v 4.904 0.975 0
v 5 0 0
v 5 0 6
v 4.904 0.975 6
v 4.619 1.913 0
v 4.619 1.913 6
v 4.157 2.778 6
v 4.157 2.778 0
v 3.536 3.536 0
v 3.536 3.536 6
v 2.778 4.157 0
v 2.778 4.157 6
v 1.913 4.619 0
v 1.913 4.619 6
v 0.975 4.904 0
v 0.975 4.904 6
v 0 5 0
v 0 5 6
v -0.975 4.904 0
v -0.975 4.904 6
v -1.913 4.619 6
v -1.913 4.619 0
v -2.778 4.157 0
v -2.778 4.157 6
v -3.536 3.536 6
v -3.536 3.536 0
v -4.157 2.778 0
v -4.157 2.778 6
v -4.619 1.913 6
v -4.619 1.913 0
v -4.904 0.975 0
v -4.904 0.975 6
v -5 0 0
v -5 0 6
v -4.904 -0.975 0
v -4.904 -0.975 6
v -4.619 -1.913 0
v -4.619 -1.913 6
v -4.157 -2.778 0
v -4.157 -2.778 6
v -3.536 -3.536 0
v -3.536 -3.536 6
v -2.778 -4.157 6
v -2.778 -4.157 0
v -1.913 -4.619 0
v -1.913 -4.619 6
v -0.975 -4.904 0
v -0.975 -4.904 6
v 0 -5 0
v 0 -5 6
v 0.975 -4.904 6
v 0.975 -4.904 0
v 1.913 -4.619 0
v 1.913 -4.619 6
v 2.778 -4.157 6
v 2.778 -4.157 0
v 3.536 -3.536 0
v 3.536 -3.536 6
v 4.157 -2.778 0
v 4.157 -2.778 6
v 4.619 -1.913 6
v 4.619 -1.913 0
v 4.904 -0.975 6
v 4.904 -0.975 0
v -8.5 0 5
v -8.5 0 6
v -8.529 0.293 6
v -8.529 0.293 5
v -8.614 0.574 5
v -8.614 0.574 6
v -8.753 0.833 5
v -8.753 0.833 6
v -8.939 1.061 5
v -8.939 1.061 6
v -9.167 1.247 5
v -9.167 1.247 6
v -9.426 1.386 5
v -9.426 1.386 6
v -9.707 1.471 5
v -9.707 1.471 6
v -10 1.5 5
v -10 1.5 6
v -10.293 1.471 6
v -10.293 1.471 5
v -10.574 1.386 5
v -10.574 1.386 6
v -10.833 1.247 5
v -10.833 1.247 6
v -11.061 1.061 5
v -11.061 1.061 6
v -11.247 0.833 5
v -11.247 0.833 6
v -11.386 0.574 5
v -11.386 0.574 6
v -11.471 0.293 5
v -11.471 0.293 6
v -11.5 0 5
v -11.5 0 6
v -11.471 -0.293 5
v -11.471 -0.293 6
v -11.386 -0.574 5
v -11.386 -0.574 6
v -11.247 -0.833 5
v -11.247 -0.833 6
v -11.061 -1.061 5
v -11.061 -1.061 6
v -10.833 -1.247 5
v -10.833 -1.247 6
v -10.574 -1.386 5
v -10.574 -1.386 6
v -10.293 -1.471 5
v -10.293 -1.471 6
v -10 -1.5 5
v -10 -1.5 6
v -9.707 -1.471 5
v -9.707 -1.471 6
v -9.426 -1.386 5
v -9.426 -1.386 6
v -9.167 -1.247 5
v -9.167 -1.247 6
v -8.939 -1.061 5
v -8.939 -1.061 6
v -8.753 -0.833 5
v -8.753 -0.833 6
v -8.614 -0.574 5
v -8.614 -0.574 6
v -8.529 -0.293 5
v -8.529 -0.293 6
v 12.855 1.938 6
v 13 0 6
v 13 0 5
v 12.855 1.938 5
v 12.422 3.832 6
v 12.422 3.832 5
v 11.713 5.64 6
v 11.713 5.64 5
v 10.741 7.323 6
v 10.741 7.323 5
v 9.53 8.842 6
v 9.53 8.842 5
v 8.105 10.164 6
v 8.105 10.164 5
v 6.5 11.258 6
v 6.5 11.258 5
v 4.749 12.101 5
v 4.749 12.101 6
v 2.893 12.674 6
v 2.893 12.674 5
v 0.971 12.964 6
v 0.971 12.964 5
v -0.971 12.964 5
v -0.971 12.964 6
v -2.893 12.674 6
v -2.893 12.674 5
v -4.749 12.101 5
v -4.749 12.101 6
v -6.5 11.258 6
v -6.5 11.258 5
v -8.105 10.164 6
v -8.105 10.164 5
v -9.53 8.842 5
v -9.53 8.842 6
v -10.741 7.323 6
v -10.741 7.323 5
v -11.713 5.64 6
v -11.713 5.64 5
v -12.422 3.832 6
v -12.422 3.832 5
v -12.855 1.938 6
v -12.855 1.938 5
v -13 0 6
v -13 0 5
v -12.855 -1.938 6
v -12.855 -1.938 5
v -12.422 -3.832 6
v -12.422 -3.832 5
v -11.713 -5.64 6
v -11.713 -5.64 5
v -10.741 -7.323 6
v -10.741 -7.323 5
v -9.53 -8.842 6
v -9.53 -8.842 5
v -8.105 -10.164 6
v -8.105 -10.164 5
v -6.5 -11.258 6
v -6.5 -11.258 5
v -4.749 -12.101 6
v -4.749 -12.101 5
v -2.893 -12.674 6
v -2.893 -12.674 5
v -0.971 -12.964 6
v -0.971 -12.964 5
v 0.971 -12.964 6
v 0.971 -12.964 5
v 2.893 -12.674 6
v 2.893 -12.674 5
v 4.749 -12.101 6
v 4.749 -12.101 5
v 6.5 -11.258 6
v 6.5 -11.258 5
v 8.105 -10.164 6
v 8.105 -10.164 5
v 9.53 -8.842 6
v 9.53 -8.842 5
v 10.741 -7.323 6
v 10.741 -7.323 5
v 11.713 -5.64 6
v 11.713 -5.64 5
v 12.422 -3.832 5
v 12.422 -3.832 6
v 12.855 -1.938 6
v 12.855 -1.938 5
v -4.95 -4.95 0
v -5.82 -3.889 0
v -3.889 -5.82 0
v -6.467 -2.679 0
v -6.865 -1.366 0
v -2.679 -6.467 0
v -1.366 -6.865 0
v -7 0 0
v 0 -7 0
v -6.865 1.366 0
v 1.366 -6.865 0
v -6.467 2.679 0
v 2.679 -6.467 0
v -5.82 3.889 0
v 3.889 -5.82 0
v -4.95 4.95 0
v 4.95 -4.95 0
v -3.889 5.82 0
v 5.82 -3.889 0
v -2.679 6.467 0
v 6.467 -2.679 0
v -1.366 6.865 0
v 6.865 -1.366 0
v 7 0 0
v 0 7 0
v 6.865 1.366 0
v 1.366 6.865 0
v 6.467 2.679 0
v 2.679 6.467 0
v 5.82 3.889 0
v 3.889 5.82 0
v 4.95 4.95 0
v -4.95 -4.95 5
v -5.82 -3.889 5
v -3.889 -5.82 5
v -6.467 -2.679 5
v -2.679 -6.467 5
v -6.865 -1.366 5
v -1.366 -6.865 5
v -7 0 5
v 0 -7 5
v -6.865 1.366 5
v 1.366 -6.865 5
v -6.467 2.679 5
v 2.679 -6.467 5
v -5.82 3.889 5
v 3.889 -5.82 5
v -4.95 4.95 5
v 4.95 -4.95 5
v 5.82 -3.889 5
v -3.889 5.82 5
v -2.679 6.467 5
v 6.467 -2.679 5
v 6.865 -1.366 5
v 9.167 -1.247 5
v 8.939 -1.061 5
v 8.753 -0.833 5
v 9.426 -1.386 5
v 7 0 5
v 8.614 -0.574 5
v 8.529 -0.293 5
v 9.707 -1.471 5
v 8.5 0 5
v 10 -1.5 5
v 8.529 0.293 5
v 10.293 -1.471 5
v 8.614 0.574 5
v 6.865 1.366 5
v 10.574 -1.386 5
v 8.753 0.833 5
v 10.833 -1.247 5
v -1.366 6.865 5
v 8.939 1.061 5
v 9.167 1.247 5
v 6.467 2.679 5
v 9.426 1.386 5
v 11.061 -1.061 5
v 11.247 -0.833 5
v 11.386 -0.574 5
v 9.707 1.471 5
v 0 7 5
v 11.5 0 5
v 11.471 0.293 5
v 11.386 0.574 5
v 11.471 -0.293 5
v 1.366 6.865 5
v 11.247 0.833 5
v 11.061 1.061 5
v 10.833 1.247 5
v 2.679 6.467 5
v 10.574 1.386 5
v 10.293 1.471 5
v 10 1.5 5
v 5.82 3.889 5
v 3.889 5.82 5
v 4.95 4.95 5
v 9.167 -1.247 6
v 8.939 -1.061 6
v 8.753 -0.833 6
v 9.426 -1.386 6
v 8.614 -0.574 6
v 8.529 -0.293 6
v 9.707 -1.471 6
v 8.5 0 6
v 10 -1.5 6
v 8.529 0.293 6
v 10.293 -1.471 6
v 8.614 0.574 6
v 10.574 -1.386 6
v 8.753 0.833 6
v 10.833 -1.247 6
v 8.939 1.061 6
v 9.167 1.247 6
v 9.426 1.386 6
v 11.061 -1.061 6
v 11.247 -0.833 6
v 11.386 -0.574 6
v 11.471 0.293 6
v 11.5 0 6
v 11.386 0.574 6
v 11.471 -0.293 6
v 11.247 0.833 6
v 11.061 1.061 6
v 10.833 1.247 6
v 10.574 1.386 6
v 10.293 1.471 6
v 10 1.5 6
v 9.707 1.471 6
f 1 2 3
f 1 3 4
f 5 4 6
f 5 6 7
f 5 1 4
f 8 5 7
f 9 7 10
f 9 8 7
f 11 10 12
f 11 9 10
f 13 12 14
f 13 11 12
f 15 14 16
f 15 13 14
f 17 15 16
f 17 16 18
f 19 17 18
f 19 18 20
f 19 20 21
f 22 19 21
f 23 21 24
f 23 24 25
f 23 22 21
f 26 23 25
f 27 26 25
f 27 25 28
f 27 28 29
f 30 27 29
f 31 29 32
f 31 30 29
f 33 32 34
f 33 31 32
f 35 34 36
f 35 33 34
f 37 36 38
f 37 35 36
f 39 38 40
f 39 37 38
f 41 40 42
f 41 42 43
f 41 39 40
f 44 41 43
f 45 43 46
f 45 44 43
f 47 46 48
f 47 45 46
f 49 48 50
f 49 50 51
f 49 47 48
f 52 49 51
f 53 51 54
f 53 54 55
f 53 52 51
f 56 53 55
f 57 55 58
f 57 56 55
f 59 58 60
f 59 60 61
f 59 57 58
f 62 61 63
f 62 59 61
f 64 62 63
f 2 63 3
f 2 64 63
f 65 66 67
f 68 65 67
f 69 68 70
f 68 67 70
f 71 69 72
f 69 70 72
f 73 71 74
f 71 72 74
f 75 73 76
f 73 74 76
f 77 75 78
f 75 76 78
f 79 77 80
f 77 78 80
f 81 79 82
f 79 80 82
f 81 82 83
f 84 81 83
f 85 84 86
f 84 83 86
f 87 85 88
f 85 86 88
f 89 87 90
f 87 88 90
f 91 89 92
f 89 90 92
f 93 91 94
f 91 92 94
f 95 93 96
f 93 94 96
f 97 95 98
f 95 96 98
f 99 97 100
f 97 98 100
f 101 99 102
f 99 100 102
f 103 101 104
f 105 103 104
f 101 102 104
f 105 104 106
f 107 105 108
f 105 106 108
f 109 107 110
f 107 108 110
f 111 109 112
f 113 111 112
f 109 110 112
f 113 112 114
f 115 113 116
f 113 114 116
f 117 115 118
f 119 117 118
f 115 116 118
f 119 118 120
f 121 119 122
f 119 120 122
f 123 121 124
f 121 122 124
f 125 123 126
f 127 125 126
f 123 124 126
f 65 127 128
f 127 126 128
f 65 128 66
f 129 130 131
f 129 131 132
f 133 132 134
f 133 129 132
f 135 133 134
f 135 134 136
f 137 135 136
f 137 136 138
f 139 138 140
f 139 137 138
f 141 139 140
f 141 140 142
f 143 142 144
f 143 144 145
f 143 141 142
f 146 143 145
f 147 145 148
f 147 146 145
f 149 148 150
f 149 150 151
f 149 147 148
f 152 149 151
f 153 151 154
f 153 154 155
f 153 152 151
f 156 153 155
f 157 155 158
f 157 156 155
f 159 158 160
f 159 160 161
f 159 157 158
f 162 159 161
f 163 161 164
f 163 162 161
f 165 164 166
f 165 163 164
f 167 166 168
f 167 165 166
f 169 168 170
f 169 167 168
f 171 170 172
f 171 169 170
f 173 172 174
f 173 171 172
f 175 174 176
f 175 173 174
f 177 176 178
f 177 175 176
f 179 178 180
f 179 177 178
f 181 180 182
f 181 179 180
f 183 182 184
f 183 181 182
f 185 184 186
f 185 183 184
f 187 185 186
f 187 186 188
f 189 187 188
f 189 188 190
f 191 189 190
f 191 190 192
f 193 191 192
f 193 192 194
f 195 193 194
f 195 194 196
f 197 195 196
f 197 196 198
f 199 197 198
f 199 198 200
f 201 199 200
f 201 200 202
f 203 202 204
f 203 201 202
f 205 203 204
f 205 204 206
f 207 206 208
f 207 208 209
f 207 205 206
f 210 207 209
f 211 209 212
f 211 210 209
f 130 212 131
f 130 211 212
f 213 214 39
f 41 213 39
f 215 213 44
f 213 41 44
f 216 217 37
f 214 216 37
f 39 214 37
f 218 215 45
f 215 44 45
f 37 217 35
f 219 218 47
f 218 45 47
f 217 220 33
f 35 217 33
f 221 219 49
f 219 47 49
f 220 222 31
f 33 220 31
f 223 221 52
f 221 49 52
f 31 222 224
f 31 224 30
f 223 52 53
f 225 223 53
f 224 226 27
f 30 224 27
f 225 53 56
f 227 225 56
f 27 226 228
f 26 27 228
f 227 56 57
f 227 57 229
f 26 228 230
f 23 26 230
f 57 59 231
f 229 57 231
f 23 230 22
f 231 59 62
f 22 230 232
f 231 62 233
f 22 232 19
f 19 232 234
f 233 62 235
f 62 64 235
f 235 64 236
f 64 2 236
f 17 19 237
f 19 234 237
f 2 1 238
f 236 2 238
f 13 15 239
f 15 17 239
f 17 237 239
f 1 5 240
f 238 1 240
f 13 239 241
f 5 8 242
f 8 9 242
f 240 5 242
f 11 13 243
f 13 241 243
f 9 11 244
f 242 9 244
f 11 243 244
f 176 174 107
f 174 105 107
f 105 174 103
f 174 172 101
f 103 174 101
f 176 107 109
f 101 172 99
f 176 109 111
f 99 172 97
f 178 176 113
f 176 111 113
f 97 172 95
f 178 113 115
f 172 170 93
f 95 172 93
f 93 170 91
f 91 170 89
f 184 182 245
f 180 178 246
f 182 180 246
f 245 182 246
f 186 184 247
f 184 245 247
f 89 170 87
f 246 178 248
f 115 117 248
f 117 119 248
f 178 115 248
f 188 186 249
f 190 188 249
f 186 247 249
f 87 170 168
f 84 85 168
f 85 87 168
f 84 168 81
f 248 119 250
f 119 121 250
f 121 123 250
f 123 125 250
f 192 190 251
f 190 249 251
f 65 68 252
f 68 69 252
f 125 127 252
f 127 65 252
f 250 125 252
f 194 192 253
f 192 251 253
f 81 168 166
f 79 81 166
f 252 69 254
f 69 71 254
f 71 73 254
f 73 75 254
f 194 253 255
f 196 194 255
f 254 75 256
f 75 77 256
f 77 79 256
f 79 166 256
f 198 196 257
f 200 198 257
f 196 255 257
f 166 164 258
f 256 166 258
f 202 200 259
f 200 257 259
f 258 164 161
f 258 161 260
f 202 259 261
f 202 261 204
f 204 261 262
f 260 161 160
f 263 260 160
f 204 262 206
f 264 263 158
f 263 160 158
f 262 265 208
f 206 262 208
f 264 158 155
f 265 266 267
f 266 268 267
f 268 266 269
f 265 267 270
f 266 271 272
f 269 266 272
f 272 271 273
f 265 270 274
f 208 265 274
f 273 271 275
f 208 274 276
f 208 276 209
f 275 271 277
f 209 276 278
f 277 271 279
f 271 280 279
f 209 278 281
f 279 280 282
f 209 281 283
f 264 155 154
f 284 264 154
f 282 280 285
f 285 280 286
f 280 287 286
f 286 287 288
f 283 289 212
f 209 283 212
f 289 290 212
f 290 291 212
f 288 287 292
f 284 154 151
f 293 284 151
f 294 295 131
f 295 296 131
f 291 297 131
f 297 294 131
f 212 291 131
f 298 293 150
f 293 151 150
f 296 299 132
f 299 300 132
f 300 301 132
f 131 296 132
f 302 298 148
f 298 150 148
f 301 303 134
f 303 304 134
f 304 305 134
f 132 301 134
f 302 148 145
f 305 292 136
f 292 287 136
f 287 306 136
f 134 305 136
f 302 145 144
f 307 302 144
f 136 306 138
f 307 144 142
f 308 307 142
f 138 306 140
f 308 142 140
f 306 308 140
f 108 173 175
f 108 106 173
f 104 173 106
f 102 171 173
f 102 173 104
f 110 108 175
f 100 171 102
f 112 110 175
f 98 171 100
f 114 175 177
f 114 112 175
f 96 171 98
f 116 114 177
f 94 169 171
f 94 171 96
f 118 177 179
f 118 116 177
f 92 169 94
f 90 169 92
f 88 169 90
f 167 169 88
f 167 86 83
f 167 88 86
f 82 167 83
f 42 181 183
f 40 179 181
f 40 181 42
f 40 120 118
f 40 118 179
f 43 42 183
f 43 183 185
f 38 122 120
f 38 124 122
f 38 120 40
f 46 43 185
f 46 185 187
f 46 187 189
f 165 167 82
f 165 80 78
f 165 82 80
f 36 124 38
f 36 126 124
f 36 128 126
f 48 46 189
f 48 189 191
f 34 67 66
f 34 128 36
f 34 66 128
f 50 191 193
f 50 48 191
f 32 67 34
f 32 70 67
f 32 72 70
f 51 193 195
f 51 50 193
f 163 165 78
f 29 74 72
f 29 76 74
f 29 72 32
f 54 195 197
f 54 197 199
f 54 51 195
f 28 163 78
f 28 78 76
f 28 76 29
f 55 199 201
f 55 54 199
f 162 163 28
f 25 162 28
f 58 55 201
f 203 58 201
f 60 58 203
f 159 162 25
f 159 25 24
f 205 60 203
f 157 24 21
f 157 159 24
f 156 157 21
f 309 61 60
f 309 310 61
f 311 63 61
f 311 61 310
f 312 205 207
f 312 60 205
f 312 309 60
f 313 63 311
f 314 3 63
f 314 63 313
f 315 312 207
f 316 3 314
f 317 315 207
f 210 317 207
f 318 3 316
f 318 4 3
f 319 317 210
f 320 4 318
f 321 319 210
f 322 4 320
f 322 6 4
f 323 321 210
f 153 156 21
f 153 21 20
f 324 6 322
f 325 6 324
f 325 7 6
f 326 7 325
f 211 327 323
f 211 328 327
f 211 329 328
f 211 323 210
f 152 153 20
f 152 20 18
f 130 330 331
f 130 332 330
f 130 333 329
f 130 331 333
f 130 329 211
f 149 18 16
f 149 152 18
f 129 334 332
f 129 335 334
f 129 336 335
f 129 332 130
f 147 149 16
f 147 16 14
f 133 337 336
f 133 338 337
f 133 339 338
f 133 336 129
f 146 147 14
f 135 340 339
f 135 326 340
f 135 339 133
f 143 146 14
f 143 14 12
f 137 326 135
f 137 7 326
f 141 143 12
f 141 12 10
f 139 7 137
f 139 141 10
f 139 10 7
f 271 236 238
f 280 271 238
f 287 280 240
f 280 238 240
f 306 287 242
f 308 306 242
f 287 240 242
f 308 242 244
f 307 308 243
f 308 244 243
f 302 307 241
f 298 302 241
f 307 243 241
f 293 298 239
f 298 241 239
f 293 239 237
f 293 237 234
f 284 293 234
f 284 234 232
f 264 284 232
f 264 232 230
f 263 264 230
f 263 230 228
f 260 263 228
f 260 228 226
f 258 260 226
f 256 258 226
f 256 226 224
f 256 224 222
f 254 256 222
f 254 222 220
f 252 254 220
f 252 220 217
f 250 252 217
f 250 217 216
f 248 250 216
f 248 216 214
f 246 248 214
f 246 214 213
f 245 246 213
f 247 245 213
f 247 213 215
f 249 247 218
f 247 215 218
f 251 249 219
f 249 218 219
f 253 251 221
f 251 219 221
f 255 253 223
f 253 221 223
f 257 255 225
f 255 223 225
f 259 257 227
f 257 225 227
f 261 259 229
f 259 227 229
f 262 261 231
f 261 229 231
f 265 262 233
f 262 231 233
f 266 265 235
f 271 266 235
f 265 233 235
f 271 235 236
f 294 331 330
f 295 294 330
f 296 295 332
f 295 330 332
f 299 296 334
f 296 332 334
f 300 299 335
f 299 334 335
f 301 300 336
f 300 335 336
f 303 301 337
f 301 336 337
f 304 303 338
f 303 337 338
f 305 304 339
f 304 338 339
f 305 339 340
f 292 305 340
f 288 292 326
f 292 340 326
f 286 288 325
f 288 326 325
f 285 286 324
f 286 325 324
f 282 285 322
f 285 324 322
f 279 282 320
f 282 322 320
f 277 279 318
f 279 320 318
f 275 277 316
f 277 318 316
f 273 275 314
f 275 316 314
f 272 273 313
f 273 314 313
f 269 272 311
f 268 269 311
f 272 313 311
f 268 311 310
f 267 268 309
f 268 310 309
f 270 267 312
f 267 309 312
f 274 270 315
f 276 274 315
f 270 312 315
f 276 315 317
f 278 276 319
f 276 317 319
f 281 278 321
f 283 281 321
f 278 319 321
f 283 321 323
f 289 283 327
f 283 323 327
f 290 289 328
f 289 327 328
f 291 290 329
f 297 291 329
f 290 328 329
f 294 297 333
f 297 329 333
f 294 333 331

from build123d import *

# Parameters (mm, degrees)
SKETCH1_R           = 7
SKETCH1_R_2         = 5
BOSS_EXTRUDE1_DEPTH = 6
SKETCH2_R           = 13
SKETCH2_R_2         = 7
BOSS_EXTRUDE2_DEPTH = 1
SKETCH3_R           = 1.5
CUT_EXTRUDE1_DEPTH  = 1


with BuildPart() as part:
    # Sketch1 → Boss-Extrude1 (new body)
    with BuildSketch(Plane.XY):
        Circle(SKETCH1_R)
        Circle(SKETCH1_R_2, mode=Mode.SUBTRACT)
    extrude(amount=BOSS_EXTRUDE1_DEPTH)

    # Sketch2 → Boss-Extrude2 (add)
    with BuildSketch(Plane.XY.offset(6)):
        Circle(SKETCH2_R)
        Circle(SKETCH2_R_2, mode=Mode.SUBTRACT)
    extrude(amount=-BOSS_EXTRUDE2_DEPTH)

    # Sketch3 → Cut-Extrude1 (cut)
    with BuildSketch(Plane.XY.offset(6)):
        with Locations((-10, 0)):
            Circle(SKETCH3_R)
        with Locations((10, 0)):
            Circle(SKETCH3_R)
    extrude(amount=-CUT_EXTRUDE1_DEPTH, mode=Mode.SUBTRACT)


solid = part.part
